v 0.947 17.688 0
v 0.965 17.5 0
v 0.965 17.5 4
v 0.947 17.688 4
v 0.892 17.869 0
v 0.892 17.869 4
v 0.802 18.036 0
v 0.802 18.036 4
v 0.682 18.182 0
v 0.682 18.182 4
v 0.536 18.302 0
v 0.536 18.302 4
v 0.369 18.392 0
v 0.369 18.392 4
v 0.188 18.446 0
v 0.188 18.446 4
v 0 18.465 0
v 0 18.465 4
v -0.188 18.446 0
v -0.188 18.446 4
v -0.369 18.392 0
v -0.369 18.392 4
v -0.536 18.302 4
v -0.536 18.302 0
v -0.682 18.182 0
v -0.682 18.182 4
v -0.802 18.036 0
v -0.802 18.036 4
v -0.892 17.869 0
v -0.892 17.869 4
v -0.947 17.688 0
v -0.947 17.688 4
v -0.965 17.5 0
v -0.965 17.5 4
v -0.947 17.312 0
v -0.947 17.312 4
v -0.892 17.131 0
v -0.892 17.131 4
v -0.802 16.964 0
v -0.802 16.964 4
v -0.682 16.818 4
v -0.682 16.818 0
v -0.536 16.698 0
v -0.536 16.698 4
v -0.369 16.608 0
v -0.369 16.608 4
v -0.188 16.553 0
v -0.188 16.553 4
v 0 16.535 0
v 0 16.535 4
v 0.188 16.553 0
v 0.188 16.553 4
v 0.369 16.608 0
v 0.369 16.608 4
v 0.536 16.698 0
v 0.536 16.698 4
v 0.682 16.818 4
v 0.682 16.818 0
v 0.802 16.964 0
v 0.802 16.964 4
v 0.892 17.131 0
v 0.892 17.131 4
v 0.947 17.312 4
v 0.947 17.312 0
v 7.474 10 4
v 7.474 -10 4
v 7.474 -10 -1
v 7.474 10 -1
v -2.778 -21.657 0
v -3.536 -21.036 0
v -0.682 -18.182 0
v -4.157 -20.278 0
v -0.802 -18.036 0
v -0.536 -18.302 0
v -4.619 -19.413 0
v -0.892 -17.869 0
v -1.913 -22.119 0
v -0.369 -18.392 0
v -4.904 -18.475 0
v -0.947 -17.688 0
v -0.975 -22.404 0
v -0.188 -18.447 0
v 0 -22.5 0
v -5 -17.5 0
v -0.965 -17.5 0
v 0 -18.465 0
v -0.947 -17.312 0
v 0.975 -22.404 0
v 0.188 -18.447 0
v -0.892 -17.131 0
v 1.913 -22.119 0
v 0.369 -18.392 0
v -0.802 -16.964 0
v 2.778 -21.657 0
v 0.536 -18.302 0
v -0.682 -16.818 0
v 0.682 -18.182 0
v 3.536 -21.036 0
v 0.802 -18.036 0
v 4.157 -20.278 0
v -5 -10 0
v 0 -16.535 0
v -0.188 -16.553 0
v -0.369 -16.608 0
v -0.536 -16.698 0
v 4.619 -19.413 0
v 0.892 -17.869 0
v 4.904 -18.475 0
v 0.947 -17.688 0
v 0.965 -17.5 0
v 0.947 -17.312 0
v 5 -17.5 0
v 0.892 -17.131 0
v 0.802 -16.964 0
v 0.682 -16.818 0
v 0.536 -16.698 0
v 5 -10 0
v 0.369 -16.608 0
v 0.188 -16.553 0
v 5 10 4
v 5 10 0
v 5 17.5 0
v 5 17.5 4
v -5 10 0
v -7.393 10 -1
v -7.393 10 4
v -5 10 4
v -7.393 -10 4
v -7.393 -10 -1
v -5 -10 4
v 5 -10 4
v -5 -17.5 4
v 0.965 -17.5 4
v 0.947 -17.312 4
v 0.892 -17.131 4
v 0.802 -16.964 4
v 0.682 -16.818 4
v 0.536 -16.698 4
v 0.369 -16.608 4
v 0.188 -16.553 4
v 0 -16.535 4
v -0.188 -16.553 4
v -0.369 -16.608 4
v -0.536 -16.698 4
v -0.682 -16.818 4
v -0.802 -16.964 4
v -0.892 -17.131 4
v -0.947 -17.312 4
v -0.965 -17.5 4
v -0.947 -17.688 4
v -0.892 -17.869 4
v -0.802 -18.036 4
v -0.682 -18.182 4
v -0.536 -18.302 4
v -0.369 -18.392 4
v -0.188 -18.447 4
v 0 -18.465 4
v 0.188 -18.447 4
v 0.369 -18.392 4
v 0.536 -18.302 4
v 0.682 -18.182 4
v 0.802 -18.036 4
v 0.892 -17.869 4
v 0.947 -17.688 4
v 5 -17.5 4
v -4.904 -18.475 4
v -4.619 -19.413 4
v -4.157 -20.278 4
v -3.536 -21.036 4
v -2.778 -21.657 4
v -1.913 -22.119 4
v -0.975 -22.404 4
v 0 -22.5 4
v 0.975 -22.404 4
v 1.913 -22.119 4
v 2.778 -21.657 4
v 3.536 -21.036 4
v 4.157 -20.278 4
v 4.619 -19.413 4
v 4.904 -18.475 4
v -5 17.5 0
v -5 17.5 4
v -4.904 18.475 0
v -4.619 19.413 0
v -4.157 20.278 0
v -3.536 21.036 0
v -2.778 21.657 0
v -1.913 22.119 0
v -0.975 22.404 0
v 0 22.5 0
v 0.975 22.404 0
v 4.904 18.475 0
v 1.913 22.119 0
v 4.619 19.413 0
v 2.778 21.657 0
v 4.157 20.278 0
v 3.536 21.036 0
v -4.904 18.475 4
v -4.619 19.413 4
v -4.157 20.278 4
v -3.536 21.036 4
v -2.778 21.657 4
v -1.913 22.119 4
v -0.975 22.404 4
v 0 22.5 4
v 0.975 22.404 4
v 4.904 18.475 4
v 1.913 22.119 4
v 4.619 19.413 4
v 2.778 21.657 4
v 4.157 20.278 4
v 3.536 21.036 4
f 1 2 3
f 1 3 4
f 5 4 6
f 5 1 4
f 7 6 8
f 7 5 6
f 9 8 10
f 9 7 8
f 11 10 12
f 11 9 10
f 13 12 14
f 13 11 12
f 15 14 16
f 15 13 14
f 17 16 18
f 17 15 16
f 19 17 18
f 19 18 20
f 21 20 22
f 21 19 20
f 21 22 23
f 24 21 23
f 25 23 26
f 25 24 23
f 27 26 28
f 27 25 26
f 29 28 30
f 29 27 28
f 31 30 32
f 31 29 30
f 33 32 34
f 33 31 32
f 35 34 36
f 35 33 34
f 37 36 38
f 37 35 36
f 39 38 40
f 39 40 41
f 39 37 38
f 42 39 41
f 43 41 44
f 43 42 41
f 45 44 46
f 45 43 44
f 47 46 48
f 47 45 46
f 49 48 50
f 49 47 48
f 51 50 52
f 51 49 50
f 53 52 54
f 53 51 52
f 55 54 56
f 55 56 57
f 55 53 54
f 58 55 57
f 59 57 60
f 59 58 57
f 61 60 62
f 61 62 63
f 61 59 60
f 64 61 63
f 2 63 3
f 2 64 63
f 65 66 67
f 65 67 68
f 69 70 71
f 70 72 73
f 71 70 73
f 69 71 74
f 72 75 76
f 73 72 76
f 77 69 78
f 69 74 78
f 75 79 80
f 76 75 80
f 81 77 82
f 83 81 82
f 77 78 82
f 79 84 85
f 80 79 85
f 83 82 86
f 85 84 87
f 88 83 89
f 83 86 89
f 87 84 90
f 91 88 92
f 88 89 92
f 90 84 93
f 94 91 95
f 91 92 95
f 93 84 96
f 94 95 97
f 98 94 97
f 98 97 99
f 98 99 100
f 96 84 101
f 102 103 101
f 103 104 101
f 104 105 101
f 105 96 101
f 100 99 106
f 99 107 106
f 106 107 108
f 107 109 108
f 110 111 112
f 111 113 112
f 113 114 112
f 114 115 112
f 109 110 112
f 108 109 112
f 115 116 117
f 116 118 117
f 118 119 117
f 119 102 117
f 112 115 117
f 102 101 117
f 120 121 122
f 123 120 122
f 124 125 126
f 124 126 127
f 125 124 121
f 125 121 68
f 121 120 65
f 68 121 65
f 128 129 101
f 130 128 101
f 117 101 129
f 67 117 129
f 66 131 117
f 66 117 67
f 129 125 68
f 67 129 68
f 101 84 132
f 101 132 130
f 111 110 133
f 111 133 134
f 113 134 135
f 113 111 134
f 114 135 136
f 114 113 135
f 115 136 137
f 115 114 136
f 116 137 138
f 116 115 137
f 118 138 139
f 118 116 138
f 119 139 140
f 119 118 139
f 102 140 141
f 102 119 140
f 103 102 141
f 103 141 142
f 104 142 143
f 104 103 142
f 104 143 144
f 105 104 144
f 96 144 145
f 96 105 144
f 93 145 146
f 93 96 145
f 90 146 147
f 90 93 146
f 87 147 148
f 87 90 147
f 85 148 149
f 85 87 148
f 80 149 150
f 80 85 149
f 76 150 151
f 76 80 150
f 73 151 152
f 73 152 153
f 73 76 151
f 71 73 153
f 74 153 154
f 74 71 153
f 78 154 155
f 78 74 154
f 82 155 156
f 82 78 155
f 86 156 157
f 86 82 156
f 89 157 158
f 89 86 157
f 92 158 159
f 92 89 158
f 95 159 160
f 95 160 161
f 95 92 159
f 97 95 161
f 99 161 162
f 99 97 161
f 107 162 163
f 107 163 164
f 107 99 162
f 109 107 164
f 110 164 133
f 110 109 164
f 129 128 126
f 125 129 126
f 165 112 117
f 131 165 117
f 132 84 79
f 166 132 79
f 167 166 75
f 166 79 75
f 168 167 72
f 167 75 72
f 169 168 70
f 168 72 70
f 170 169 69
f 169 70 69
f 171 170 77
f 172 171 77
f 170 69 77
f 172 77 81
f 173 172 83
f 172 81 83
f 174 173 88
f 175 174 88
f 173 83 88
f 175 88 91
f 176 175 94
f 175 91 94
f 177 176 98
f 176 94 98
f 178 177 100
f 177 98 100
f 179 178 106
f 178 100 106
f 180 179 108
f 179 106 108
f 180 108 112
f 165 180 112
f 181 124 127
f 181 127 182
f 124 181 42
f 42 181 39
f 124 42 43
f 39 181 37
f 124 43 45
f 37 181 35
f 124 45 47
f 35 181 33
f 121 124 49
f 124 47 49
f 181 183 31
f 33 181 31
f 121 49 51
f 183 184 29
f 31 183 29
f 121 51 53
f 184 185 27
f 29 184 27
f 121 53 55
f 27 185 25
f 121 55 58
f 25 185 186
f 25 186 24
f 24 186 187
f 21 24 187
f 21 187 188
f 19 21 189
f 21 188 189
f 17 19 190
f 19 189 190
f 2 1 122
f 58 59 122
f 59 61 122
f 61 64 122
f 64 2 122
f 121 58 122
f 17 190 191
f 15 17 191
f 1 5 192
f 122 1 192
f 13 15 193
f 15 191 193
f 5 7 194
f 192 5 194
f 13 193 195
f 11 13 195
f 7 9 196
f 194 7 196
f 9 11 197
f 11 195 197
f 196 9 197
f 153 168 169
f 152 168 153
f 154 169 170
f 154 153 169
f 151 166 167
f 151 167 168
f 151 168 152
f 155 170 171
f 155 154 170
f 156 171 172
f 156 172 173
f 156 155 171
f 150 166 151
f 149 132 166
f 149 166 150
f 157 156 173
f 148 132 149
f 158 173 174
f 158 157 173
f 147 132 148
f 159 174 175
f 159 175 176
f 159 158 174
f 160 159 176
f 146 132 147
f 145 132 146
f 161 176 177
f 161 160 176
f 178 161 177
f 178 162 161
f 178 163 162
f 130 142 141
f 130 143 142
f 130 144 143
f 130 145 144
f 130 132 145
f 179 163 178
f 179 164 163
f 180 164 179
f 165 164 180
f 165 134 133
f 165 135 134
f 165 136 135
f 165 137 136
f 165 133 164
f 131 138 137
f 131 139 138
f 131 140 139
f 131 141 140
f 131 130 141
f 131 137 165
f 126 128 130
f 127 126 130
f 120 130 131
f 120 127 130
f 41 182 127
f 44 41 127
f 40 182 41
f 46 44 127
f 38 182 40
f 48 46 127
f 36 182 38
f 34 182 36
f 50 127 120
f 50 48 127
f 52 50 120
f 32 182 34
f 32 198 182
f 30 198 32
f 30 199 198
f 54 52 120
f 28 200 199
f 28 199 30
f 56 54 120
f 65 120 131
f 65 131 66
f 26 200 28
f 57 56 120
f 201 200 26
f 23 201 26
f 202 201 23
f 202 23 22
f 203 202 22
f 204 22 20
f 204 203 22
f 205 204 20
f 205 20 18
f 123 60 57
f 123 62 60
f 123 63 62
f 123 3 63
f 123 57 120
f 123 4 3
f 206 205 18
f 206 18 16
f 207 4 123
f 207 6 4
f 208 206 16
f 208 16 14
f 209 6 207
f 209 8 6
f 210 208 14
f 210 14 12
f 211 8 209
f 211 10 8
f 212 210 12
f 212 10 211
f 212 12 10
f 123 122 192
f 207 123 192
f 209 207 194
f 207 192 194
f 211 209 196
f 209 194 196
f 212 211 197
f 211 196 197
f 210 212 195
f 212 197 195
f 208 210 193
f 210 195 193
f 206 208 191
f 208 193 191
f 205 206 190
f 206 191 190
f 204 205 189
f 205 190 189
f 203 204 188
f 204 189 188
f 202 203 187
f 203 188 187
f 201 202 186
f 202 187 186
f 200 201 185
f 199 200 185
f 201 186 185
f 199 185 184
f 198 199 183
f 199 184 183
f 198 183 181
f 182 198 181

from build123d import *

# Parameters (mm, degrees)
SKETCH001_R  = 0.965047
PAD_DEPTH    = 4
SKETCH_W     = 14.86762
SKETCH_H     = 20
PAD001_DEPTH = 5


with BuildPart() as part:
    # Sketch001 → Pad (new body)
    with BuildSketch(Plane.XY):
        with BuildLine():
            ThreePointArc((-5, -17.500002), (0, -22.500002), (5, -17.500002))
            Line((5, -17.500002), (5, 0))
            Line((5, 0), (5, 17.500002))
            ThreePointArc((5, 17.500002), (-2e-06, 22.499991), (-5, 17.499998))
            Line((-5, -17.500002), (-5, 17.499998))
        make_face()
        with Locations((0, 17.499991)):
            Circle(SKETCH001_R, mode=Mode.SUBTRACT)
        with Locations((0, -17.500002)):
            Circle(SKETCH001_R, mode=Mode.SUBTRACT)
    extrude(amount=PAD_DEPTH)

    # Sketch (on Face7 of Pad) → Pad001 (join)
    with BuildSketch(Plane.XY.offset(4)):
        with Locations((0.040686, 0)):
            Rectangle(SKETCH_W, SKETCH_H)
    extrude(amount=-PAD001_DEPTH)


solid = part.part
